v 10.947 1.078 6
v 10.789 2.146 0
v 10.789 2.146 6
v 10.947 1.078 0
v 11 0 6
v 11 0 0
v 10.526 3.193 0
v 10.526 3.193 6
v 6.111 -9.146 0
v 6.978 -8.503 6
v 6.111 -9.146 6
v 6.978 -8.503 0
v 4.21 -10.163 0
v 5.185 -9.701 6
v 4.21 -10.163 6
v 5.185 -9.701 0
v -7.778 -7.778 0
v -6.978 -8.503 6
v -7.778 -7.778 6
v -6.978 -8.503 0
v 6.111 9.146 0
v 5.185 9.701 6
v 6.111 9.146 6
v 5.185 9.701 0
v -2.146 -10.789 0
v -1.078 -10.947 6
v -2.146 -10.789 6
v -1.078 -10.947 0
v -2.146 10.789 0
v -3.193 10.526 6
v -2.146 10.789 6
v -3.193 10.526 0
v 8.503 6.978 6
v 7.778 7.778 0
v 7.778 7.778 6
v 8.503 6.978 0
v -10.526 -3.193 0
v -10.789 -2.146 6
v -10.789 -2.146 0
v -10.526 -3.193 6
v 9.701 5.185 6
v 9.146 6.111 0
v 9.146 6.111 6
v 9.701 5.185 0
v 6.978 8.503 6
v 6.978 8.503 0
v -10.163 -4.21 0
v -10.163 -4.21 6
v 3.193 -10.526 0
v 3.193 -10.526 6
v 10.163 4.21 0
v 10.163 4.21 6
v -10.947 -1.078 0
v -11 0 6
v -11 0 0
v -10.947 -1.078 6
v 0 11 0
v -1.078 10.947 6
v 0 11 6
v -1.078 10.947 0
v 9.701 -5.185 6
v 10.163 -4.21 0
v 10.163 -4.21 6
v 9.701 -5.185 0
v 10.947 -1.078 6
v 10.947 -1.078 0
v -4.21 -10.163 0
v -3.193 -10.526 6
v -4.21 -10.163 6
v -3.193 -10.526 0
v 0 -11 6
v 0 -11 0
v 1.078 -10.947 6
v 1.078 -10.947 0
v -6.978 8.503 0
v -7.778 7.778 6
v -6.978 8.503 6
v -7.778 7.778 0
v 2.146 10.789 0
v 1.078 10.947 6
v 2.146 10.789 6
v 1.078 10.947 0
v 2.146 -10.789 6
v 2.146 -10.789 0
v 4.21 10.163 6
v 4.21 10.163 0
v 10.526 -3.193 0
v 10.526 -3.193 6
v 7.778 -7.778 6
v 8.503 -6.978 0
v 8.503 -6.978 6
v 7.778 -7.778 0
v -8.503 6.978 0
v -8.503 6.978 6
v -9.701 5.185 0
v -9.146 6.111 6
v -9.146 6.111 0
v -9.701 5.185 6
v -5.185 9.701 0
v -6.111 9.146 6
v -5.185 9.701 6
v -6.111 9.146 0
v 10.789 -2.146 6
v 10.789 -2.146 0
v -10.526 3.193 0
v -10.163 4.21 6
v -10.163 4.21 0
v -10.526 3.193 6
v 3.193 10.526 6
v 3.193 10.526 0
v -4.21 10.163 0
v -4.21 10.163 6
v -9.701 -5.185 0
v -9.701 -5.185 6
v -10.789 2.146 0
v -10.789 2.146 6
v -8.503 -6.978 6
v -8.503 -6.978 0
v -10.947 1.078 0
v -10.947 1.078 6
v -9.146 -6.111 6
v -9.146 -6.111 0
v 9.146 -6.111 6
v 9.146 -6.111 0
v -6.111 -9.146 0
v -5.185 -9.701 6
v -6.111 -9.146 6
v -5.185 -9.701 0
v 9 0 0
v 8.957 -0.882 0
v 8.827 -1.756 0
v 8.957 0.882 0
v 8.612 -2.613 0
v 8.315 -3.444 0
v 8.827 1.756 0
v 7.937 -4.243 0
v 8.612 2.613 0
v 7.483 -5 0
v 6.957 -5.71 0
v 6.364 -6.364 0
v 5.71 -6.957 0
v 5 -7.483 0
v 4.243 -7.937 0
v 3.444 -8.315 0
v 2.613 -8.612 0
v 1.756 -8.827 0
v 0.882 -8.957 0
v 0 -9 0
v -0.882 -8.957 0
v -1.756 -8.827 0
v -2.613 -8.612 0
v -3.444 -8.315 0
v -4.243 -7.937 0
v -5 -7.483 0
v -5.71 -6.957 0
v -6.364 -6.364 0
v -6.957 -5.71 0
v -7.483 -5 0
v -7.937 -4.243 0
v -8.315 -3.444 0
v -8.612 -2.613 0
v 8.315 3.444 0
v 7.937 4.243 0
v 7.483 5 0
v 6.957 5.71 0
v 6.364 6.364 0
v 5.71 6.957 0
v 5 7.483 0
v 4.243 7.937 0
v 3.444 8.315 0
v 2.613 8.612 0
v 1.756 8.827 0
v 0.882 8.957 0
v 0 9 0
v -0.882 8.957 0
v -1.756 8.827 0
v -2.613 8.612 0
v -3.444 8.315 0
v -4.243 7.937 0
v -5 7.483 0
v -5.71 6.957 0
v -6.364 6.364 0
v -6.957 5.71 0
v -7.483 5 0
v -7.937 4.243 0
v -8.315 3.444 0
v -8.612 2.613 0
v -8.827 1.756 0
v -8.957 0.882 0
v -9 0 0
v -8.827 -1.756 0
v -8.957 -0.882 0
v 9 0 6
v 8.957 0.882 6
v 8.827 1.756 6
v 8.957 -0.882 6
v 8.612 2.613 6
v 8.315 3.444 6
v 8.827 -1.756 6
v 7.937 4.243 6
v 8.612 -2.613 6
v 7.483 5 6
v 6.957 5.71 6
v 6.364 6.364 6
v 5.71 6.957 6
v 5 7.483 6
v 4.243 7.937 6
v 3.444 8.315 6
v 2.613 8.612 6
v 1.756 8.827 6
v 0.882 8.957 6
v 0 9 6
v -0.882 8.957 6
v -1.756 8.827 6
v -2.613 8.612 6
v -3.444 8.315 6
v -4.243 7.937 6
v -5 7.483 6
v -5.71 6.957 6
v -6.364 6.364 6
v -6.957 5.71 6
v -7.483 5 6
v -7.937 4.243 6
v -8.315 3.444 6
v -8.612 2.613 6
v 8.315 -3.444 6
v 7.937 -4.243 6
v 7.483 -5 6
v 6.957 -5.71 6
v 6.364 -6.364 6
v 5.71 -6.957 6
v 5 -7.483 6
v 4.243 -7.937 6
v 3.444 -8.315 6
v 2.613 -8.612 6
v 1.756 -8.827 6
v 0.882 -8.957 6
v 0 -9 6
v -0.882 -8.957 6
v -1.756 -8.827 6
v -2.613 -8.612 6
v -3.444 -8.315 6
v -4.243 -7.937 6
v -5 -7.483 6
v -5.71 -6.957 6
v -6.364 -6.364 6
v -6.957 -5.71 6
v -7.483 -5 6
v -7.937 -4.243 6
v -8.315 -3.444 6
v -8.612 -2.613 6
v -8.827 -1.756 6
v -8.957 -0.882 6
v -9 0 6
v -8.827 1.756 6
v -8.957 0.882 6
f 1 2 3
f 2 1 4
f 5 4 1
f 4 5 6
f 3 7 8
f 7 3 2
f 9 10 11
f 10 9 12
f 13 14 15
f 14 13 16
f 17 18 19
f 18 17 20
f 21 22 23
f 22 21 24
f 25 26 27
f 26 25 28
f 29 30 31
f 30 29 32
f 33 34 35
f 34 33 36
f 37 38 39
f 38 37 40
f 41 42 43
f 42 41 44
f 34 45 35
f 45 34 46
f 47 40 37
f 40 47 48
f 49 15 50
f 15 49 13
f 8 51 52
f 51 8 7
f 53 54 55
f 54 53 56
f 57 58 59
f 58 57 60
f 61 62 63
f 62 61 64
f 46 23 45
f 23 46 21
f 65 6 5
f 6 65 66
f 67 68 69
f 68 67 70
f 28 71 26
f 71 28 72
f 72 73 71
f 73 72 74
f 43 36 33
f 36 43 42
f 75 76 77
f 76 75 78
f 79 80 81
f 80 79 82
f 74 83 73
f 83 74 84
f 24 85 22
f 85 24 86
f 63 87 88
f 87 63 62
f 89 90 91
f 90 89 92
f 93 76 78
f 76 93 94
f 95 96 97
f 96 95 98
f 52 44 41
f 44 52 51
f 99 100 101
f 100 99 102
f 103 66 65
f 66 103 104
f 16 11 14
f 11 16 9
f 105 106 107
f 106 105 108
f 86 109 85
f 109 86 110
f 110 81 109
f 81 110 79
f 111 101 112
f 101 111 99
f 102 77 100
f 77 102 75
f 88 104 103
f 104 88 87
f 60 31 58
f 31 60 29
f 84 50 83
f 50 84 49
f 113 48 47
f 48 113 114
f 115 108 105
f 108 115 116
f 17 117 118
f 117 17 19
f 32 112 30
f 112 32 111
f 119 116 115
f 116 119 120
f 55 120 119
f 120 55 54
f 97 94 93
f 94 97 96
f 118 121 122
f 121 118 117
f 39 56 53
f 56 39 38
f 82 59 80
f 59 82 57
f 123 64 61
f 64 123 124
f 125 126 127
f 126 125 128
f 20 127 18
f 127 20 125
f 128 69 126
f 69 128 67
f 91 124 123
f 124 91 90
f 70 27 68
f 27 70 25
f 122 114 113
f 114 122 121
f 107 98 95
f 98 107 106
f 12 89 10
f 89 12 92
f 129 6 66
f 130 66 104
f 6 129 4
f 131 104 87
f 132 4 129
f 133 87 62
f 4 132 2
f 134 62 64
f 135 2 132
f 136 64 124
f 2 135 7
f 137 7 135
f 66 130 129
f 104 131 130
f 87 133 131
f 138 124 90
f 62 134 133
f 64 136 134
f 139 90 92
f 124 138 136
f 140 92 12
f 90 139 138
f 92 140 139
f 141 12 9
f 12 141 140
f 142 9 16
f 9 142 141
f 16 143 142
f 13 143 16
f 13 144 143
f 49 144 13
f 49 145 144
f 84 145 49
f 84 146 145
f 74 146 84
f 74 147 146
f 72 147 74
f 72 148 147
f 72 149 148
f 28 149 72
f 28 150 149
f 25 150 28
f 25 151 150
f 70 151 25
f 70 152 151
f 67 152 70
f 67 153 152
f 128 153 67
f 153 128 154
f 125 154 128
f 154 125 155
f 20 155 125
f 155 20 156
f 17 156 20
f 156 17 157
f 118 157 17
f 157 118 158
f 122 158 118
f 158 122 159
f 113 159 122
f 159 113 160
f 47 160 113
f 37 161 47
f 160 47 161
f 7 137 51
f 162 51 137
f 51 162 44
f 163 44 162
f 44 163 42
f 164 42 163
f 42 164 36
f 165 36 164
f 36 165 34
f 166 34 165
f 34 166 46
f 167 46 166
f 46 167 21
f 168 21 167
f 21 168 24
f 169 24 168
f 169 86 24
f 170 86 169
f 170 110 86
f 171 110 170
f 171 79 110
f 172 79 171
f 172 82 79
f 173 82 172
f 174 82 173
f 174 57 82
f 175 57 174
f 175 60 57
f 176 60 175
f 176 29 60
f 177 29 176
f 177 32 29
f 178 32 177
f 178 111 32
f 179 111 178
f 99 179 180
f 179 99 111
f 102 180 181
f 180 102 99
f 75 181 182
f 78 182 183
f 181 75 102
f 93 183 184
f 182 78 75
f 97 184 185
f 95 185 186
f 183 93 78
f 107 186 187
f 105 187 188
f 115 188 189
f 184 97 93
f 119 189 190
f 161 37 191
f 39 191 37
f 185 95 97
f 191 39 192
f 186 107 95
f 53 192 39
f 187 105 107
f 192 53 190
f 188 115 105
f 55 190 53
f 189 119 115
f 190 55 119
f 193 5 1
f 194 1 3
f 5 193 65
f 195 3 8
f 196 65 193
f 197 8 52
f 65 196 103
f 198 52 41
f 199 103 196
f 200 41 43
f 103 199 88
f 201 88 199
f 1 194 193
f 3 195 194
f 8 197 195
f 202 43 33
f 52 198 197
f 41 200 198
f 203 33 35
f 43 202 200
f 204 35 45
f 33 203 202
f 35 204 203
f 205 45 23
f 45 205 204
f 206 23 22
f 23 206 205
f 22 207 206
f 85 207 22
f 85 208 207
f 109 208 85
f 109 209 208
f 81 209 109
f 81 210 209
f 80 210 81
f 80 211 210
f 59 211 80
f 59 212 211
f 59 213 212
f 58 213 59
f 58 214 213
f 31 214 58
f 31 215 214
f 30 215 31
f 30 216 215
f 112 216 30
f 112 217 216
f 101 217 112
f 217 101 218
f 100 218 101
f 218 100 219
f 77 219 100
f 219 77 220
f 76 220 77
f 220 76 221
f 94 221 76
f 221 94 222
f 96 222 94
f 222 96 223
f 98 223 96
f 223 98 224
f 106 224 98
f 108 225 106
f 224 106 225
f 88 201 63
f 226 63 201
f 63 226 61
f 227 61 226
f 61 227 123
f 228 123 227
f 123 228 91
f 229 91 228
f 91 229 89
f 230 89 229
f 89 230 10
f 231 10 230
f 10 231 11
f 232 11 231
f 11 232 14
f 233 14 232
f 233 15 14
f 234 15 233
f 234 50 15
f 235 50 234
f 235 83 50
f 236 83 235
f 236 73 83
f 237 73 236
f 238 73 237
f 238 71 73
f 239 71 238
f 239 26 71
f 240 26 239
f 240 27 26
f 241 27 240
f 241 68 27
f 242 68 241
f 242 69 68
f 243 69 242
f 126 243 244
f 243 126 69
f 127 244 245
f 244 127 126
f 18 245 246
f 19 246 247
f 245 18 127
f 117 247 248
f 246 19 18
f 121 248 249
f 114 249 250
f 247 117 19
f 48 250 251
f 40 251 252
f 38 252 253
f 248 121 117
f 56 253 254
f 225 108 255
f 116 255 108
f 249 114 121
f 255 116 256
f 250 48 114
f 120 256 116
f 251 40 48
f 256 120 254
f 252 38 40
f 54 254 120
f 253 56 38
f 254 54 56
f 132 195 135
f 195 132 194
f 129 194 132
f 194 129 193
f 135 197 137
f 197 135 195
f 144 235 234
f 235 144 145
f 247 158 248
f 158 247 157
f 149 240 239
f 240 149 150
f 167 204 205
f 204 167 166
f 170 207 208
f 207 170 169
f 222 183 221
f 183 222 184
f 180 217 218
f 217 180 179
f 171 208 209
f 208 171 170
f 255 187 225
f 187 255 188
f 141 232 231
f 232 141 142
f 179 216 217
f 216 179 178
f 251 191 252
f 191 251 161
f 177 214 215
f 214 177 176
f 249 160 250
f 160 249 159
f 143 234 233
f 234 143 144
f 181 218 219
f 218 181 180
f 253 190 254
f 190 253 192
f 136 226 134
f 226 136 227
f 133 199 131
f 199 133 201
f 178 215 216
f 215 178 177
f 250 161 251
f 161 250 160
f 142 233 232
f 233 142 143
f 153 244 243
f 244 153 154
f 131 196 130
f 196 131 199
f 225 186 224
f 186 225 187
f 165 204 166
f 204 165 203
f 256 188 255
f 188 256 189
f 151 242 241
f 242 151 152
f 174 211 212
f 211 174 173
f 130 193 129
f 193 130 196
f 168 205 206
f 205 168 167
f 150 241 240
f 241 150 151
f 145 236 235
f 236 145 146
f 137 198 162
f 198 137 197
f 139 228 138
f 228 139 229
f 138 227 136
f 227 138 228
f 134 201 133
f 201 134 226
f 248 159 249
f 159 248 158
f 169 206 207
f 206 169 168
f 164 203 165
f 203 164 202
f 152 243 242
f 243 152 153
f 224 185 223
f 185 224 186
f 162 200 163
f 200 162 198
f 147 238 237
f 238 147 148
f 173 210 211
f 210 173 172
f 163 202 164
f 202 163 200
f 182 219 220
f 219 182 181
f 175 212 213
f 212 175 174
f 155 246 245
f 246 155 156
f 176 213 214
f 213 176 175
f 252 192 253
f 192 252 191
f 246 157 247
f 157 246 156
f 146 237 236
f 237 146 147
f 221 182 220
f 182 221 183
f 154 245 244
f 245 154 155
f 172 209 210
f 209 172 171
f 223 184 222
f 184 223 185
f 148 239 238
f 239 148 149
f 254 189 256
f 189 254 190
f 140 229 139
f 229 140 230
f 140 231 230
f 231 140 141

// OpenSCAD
// expect: text("love") doesn't touch the shape it is cut from
// The same AI's first try: "love" embossed into the top of the ring – centred, so it lands in the
// ring's hole and cuts nothing.
outer_diameter = 22;
inner_diameter = 18;
ring_height = 6;
text_size = 3;
text_depth = 0.6;
difference() {
    cylinder(d=outer_diameter, h=ring_height, $fn=64);
    translate([0, 0, -0.1])
    cylinder(d=inner_diameter, h=ring_height+0.2, $fn=64);
    translate([0, 0, ring_height - text_depth])
    linear_extrude(height=text_depth+0.1)
    text("love", size=text_size, halign="center", valign="center", font="Liberation Sans");
}
